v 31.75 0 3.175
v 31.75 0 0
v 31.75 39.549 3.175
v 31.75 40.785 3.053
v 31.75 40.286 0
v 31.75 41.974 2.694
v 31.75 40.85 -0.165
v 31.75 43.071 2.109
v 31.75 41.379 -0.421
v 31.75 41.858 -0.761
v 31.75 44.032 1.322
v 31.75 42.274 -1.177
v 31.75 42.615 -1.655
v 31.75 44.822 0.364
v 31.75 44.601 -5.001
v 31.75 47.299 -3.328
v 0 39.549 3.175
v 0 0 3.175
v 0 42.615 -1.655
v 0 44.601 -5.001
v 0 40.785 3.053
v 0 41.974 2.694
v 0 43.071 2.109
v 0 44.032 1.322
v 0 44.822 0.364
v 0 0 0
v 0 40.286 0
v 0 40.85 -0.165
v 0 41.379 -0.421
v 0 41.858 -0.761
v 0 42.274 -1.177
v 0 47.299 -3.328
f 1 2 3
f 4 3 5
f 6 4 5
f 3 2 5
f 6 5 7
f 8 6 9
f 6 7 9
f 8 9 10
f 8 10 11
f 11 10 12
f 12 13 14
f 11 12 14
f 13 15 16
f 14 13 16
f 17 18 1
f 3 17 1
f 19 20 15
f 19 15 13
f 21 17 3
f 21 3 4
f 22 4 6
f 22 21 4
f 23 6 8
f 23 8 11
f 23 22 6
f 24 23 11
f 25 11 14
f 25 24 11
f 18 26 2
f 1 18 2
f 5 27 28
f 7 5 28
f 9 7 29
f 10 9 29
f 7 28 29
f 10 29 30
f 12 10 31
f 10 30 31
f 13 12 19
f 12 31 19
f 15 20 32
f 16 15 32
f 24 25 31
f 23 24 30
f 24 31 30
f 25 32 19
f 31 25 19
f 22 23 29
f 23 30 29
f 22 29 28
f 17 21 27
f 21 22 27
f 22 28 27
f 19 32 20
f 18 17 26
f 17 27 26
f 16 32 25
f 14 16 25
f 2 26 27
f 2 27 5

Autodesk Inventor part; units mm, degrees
ref_plane "YZ Plane" through (0, 0, 0) normal (1, 0, 0) x (0, 1, 0)
ref_plane "XZ Plane" through (0, 0, 0) normal (0, 1, 0) x (-1, 0, 0)
ref_plane "XY Plane" through (0, 0, 0) normal (0, 0, 1) x (1, 0, 0)
sketch "Sketch1" plane through (0, 0, 0) normal (0, 0, 1) x (1, 0, 0)
  line L0 (0, 0) -> (31.75, 0)
  line L1 (31.75, 0) -> (31.75, 42.935)
  line L2 (31.75, 42.935) -> (0, 42.935)
  line L3 (0, 42.935) -> (0, 0)
  dimension "d0" = 31.75
extrude "Extrusion1" add sketch "Sketch1" along normal blind 3.175
sketch "Sketch2" plane through (0, 0, 0) normal (-1, 0, 0) x (0, 0, 1)
  line L0 (-5.0008, 44.6006) -> (-1.6553, 42.6148)
  arc A0 (0, 40.2857) -> (-1.6553, 42.6148) centre (-3.4548, 39.5831) ccw
  line L1 (-5.0008, 44.6006) -> (-3.3281, 47.2993)
  line L2 (3.175, 0) -> (3.175, 42.935) projected
  line L3 (-3.3281, 47.2993) -> (3.175, 42.935)
  line L4 (0, 0) -> (0, 42.935) projected
  line L5 (0, 40.2857) -> (0, 42.935)
  line L6 (0, 42.935) -> (3.175, 42.935)
  dimension "d3" = 3.175
extrude "Extrusion2" add sketch "Sketch2" against normal blind 31.75
fillet "Fillet1" radius 6.35 1 edges at (15.875, 42.935, 3.175)
properties part number "slide plate"
